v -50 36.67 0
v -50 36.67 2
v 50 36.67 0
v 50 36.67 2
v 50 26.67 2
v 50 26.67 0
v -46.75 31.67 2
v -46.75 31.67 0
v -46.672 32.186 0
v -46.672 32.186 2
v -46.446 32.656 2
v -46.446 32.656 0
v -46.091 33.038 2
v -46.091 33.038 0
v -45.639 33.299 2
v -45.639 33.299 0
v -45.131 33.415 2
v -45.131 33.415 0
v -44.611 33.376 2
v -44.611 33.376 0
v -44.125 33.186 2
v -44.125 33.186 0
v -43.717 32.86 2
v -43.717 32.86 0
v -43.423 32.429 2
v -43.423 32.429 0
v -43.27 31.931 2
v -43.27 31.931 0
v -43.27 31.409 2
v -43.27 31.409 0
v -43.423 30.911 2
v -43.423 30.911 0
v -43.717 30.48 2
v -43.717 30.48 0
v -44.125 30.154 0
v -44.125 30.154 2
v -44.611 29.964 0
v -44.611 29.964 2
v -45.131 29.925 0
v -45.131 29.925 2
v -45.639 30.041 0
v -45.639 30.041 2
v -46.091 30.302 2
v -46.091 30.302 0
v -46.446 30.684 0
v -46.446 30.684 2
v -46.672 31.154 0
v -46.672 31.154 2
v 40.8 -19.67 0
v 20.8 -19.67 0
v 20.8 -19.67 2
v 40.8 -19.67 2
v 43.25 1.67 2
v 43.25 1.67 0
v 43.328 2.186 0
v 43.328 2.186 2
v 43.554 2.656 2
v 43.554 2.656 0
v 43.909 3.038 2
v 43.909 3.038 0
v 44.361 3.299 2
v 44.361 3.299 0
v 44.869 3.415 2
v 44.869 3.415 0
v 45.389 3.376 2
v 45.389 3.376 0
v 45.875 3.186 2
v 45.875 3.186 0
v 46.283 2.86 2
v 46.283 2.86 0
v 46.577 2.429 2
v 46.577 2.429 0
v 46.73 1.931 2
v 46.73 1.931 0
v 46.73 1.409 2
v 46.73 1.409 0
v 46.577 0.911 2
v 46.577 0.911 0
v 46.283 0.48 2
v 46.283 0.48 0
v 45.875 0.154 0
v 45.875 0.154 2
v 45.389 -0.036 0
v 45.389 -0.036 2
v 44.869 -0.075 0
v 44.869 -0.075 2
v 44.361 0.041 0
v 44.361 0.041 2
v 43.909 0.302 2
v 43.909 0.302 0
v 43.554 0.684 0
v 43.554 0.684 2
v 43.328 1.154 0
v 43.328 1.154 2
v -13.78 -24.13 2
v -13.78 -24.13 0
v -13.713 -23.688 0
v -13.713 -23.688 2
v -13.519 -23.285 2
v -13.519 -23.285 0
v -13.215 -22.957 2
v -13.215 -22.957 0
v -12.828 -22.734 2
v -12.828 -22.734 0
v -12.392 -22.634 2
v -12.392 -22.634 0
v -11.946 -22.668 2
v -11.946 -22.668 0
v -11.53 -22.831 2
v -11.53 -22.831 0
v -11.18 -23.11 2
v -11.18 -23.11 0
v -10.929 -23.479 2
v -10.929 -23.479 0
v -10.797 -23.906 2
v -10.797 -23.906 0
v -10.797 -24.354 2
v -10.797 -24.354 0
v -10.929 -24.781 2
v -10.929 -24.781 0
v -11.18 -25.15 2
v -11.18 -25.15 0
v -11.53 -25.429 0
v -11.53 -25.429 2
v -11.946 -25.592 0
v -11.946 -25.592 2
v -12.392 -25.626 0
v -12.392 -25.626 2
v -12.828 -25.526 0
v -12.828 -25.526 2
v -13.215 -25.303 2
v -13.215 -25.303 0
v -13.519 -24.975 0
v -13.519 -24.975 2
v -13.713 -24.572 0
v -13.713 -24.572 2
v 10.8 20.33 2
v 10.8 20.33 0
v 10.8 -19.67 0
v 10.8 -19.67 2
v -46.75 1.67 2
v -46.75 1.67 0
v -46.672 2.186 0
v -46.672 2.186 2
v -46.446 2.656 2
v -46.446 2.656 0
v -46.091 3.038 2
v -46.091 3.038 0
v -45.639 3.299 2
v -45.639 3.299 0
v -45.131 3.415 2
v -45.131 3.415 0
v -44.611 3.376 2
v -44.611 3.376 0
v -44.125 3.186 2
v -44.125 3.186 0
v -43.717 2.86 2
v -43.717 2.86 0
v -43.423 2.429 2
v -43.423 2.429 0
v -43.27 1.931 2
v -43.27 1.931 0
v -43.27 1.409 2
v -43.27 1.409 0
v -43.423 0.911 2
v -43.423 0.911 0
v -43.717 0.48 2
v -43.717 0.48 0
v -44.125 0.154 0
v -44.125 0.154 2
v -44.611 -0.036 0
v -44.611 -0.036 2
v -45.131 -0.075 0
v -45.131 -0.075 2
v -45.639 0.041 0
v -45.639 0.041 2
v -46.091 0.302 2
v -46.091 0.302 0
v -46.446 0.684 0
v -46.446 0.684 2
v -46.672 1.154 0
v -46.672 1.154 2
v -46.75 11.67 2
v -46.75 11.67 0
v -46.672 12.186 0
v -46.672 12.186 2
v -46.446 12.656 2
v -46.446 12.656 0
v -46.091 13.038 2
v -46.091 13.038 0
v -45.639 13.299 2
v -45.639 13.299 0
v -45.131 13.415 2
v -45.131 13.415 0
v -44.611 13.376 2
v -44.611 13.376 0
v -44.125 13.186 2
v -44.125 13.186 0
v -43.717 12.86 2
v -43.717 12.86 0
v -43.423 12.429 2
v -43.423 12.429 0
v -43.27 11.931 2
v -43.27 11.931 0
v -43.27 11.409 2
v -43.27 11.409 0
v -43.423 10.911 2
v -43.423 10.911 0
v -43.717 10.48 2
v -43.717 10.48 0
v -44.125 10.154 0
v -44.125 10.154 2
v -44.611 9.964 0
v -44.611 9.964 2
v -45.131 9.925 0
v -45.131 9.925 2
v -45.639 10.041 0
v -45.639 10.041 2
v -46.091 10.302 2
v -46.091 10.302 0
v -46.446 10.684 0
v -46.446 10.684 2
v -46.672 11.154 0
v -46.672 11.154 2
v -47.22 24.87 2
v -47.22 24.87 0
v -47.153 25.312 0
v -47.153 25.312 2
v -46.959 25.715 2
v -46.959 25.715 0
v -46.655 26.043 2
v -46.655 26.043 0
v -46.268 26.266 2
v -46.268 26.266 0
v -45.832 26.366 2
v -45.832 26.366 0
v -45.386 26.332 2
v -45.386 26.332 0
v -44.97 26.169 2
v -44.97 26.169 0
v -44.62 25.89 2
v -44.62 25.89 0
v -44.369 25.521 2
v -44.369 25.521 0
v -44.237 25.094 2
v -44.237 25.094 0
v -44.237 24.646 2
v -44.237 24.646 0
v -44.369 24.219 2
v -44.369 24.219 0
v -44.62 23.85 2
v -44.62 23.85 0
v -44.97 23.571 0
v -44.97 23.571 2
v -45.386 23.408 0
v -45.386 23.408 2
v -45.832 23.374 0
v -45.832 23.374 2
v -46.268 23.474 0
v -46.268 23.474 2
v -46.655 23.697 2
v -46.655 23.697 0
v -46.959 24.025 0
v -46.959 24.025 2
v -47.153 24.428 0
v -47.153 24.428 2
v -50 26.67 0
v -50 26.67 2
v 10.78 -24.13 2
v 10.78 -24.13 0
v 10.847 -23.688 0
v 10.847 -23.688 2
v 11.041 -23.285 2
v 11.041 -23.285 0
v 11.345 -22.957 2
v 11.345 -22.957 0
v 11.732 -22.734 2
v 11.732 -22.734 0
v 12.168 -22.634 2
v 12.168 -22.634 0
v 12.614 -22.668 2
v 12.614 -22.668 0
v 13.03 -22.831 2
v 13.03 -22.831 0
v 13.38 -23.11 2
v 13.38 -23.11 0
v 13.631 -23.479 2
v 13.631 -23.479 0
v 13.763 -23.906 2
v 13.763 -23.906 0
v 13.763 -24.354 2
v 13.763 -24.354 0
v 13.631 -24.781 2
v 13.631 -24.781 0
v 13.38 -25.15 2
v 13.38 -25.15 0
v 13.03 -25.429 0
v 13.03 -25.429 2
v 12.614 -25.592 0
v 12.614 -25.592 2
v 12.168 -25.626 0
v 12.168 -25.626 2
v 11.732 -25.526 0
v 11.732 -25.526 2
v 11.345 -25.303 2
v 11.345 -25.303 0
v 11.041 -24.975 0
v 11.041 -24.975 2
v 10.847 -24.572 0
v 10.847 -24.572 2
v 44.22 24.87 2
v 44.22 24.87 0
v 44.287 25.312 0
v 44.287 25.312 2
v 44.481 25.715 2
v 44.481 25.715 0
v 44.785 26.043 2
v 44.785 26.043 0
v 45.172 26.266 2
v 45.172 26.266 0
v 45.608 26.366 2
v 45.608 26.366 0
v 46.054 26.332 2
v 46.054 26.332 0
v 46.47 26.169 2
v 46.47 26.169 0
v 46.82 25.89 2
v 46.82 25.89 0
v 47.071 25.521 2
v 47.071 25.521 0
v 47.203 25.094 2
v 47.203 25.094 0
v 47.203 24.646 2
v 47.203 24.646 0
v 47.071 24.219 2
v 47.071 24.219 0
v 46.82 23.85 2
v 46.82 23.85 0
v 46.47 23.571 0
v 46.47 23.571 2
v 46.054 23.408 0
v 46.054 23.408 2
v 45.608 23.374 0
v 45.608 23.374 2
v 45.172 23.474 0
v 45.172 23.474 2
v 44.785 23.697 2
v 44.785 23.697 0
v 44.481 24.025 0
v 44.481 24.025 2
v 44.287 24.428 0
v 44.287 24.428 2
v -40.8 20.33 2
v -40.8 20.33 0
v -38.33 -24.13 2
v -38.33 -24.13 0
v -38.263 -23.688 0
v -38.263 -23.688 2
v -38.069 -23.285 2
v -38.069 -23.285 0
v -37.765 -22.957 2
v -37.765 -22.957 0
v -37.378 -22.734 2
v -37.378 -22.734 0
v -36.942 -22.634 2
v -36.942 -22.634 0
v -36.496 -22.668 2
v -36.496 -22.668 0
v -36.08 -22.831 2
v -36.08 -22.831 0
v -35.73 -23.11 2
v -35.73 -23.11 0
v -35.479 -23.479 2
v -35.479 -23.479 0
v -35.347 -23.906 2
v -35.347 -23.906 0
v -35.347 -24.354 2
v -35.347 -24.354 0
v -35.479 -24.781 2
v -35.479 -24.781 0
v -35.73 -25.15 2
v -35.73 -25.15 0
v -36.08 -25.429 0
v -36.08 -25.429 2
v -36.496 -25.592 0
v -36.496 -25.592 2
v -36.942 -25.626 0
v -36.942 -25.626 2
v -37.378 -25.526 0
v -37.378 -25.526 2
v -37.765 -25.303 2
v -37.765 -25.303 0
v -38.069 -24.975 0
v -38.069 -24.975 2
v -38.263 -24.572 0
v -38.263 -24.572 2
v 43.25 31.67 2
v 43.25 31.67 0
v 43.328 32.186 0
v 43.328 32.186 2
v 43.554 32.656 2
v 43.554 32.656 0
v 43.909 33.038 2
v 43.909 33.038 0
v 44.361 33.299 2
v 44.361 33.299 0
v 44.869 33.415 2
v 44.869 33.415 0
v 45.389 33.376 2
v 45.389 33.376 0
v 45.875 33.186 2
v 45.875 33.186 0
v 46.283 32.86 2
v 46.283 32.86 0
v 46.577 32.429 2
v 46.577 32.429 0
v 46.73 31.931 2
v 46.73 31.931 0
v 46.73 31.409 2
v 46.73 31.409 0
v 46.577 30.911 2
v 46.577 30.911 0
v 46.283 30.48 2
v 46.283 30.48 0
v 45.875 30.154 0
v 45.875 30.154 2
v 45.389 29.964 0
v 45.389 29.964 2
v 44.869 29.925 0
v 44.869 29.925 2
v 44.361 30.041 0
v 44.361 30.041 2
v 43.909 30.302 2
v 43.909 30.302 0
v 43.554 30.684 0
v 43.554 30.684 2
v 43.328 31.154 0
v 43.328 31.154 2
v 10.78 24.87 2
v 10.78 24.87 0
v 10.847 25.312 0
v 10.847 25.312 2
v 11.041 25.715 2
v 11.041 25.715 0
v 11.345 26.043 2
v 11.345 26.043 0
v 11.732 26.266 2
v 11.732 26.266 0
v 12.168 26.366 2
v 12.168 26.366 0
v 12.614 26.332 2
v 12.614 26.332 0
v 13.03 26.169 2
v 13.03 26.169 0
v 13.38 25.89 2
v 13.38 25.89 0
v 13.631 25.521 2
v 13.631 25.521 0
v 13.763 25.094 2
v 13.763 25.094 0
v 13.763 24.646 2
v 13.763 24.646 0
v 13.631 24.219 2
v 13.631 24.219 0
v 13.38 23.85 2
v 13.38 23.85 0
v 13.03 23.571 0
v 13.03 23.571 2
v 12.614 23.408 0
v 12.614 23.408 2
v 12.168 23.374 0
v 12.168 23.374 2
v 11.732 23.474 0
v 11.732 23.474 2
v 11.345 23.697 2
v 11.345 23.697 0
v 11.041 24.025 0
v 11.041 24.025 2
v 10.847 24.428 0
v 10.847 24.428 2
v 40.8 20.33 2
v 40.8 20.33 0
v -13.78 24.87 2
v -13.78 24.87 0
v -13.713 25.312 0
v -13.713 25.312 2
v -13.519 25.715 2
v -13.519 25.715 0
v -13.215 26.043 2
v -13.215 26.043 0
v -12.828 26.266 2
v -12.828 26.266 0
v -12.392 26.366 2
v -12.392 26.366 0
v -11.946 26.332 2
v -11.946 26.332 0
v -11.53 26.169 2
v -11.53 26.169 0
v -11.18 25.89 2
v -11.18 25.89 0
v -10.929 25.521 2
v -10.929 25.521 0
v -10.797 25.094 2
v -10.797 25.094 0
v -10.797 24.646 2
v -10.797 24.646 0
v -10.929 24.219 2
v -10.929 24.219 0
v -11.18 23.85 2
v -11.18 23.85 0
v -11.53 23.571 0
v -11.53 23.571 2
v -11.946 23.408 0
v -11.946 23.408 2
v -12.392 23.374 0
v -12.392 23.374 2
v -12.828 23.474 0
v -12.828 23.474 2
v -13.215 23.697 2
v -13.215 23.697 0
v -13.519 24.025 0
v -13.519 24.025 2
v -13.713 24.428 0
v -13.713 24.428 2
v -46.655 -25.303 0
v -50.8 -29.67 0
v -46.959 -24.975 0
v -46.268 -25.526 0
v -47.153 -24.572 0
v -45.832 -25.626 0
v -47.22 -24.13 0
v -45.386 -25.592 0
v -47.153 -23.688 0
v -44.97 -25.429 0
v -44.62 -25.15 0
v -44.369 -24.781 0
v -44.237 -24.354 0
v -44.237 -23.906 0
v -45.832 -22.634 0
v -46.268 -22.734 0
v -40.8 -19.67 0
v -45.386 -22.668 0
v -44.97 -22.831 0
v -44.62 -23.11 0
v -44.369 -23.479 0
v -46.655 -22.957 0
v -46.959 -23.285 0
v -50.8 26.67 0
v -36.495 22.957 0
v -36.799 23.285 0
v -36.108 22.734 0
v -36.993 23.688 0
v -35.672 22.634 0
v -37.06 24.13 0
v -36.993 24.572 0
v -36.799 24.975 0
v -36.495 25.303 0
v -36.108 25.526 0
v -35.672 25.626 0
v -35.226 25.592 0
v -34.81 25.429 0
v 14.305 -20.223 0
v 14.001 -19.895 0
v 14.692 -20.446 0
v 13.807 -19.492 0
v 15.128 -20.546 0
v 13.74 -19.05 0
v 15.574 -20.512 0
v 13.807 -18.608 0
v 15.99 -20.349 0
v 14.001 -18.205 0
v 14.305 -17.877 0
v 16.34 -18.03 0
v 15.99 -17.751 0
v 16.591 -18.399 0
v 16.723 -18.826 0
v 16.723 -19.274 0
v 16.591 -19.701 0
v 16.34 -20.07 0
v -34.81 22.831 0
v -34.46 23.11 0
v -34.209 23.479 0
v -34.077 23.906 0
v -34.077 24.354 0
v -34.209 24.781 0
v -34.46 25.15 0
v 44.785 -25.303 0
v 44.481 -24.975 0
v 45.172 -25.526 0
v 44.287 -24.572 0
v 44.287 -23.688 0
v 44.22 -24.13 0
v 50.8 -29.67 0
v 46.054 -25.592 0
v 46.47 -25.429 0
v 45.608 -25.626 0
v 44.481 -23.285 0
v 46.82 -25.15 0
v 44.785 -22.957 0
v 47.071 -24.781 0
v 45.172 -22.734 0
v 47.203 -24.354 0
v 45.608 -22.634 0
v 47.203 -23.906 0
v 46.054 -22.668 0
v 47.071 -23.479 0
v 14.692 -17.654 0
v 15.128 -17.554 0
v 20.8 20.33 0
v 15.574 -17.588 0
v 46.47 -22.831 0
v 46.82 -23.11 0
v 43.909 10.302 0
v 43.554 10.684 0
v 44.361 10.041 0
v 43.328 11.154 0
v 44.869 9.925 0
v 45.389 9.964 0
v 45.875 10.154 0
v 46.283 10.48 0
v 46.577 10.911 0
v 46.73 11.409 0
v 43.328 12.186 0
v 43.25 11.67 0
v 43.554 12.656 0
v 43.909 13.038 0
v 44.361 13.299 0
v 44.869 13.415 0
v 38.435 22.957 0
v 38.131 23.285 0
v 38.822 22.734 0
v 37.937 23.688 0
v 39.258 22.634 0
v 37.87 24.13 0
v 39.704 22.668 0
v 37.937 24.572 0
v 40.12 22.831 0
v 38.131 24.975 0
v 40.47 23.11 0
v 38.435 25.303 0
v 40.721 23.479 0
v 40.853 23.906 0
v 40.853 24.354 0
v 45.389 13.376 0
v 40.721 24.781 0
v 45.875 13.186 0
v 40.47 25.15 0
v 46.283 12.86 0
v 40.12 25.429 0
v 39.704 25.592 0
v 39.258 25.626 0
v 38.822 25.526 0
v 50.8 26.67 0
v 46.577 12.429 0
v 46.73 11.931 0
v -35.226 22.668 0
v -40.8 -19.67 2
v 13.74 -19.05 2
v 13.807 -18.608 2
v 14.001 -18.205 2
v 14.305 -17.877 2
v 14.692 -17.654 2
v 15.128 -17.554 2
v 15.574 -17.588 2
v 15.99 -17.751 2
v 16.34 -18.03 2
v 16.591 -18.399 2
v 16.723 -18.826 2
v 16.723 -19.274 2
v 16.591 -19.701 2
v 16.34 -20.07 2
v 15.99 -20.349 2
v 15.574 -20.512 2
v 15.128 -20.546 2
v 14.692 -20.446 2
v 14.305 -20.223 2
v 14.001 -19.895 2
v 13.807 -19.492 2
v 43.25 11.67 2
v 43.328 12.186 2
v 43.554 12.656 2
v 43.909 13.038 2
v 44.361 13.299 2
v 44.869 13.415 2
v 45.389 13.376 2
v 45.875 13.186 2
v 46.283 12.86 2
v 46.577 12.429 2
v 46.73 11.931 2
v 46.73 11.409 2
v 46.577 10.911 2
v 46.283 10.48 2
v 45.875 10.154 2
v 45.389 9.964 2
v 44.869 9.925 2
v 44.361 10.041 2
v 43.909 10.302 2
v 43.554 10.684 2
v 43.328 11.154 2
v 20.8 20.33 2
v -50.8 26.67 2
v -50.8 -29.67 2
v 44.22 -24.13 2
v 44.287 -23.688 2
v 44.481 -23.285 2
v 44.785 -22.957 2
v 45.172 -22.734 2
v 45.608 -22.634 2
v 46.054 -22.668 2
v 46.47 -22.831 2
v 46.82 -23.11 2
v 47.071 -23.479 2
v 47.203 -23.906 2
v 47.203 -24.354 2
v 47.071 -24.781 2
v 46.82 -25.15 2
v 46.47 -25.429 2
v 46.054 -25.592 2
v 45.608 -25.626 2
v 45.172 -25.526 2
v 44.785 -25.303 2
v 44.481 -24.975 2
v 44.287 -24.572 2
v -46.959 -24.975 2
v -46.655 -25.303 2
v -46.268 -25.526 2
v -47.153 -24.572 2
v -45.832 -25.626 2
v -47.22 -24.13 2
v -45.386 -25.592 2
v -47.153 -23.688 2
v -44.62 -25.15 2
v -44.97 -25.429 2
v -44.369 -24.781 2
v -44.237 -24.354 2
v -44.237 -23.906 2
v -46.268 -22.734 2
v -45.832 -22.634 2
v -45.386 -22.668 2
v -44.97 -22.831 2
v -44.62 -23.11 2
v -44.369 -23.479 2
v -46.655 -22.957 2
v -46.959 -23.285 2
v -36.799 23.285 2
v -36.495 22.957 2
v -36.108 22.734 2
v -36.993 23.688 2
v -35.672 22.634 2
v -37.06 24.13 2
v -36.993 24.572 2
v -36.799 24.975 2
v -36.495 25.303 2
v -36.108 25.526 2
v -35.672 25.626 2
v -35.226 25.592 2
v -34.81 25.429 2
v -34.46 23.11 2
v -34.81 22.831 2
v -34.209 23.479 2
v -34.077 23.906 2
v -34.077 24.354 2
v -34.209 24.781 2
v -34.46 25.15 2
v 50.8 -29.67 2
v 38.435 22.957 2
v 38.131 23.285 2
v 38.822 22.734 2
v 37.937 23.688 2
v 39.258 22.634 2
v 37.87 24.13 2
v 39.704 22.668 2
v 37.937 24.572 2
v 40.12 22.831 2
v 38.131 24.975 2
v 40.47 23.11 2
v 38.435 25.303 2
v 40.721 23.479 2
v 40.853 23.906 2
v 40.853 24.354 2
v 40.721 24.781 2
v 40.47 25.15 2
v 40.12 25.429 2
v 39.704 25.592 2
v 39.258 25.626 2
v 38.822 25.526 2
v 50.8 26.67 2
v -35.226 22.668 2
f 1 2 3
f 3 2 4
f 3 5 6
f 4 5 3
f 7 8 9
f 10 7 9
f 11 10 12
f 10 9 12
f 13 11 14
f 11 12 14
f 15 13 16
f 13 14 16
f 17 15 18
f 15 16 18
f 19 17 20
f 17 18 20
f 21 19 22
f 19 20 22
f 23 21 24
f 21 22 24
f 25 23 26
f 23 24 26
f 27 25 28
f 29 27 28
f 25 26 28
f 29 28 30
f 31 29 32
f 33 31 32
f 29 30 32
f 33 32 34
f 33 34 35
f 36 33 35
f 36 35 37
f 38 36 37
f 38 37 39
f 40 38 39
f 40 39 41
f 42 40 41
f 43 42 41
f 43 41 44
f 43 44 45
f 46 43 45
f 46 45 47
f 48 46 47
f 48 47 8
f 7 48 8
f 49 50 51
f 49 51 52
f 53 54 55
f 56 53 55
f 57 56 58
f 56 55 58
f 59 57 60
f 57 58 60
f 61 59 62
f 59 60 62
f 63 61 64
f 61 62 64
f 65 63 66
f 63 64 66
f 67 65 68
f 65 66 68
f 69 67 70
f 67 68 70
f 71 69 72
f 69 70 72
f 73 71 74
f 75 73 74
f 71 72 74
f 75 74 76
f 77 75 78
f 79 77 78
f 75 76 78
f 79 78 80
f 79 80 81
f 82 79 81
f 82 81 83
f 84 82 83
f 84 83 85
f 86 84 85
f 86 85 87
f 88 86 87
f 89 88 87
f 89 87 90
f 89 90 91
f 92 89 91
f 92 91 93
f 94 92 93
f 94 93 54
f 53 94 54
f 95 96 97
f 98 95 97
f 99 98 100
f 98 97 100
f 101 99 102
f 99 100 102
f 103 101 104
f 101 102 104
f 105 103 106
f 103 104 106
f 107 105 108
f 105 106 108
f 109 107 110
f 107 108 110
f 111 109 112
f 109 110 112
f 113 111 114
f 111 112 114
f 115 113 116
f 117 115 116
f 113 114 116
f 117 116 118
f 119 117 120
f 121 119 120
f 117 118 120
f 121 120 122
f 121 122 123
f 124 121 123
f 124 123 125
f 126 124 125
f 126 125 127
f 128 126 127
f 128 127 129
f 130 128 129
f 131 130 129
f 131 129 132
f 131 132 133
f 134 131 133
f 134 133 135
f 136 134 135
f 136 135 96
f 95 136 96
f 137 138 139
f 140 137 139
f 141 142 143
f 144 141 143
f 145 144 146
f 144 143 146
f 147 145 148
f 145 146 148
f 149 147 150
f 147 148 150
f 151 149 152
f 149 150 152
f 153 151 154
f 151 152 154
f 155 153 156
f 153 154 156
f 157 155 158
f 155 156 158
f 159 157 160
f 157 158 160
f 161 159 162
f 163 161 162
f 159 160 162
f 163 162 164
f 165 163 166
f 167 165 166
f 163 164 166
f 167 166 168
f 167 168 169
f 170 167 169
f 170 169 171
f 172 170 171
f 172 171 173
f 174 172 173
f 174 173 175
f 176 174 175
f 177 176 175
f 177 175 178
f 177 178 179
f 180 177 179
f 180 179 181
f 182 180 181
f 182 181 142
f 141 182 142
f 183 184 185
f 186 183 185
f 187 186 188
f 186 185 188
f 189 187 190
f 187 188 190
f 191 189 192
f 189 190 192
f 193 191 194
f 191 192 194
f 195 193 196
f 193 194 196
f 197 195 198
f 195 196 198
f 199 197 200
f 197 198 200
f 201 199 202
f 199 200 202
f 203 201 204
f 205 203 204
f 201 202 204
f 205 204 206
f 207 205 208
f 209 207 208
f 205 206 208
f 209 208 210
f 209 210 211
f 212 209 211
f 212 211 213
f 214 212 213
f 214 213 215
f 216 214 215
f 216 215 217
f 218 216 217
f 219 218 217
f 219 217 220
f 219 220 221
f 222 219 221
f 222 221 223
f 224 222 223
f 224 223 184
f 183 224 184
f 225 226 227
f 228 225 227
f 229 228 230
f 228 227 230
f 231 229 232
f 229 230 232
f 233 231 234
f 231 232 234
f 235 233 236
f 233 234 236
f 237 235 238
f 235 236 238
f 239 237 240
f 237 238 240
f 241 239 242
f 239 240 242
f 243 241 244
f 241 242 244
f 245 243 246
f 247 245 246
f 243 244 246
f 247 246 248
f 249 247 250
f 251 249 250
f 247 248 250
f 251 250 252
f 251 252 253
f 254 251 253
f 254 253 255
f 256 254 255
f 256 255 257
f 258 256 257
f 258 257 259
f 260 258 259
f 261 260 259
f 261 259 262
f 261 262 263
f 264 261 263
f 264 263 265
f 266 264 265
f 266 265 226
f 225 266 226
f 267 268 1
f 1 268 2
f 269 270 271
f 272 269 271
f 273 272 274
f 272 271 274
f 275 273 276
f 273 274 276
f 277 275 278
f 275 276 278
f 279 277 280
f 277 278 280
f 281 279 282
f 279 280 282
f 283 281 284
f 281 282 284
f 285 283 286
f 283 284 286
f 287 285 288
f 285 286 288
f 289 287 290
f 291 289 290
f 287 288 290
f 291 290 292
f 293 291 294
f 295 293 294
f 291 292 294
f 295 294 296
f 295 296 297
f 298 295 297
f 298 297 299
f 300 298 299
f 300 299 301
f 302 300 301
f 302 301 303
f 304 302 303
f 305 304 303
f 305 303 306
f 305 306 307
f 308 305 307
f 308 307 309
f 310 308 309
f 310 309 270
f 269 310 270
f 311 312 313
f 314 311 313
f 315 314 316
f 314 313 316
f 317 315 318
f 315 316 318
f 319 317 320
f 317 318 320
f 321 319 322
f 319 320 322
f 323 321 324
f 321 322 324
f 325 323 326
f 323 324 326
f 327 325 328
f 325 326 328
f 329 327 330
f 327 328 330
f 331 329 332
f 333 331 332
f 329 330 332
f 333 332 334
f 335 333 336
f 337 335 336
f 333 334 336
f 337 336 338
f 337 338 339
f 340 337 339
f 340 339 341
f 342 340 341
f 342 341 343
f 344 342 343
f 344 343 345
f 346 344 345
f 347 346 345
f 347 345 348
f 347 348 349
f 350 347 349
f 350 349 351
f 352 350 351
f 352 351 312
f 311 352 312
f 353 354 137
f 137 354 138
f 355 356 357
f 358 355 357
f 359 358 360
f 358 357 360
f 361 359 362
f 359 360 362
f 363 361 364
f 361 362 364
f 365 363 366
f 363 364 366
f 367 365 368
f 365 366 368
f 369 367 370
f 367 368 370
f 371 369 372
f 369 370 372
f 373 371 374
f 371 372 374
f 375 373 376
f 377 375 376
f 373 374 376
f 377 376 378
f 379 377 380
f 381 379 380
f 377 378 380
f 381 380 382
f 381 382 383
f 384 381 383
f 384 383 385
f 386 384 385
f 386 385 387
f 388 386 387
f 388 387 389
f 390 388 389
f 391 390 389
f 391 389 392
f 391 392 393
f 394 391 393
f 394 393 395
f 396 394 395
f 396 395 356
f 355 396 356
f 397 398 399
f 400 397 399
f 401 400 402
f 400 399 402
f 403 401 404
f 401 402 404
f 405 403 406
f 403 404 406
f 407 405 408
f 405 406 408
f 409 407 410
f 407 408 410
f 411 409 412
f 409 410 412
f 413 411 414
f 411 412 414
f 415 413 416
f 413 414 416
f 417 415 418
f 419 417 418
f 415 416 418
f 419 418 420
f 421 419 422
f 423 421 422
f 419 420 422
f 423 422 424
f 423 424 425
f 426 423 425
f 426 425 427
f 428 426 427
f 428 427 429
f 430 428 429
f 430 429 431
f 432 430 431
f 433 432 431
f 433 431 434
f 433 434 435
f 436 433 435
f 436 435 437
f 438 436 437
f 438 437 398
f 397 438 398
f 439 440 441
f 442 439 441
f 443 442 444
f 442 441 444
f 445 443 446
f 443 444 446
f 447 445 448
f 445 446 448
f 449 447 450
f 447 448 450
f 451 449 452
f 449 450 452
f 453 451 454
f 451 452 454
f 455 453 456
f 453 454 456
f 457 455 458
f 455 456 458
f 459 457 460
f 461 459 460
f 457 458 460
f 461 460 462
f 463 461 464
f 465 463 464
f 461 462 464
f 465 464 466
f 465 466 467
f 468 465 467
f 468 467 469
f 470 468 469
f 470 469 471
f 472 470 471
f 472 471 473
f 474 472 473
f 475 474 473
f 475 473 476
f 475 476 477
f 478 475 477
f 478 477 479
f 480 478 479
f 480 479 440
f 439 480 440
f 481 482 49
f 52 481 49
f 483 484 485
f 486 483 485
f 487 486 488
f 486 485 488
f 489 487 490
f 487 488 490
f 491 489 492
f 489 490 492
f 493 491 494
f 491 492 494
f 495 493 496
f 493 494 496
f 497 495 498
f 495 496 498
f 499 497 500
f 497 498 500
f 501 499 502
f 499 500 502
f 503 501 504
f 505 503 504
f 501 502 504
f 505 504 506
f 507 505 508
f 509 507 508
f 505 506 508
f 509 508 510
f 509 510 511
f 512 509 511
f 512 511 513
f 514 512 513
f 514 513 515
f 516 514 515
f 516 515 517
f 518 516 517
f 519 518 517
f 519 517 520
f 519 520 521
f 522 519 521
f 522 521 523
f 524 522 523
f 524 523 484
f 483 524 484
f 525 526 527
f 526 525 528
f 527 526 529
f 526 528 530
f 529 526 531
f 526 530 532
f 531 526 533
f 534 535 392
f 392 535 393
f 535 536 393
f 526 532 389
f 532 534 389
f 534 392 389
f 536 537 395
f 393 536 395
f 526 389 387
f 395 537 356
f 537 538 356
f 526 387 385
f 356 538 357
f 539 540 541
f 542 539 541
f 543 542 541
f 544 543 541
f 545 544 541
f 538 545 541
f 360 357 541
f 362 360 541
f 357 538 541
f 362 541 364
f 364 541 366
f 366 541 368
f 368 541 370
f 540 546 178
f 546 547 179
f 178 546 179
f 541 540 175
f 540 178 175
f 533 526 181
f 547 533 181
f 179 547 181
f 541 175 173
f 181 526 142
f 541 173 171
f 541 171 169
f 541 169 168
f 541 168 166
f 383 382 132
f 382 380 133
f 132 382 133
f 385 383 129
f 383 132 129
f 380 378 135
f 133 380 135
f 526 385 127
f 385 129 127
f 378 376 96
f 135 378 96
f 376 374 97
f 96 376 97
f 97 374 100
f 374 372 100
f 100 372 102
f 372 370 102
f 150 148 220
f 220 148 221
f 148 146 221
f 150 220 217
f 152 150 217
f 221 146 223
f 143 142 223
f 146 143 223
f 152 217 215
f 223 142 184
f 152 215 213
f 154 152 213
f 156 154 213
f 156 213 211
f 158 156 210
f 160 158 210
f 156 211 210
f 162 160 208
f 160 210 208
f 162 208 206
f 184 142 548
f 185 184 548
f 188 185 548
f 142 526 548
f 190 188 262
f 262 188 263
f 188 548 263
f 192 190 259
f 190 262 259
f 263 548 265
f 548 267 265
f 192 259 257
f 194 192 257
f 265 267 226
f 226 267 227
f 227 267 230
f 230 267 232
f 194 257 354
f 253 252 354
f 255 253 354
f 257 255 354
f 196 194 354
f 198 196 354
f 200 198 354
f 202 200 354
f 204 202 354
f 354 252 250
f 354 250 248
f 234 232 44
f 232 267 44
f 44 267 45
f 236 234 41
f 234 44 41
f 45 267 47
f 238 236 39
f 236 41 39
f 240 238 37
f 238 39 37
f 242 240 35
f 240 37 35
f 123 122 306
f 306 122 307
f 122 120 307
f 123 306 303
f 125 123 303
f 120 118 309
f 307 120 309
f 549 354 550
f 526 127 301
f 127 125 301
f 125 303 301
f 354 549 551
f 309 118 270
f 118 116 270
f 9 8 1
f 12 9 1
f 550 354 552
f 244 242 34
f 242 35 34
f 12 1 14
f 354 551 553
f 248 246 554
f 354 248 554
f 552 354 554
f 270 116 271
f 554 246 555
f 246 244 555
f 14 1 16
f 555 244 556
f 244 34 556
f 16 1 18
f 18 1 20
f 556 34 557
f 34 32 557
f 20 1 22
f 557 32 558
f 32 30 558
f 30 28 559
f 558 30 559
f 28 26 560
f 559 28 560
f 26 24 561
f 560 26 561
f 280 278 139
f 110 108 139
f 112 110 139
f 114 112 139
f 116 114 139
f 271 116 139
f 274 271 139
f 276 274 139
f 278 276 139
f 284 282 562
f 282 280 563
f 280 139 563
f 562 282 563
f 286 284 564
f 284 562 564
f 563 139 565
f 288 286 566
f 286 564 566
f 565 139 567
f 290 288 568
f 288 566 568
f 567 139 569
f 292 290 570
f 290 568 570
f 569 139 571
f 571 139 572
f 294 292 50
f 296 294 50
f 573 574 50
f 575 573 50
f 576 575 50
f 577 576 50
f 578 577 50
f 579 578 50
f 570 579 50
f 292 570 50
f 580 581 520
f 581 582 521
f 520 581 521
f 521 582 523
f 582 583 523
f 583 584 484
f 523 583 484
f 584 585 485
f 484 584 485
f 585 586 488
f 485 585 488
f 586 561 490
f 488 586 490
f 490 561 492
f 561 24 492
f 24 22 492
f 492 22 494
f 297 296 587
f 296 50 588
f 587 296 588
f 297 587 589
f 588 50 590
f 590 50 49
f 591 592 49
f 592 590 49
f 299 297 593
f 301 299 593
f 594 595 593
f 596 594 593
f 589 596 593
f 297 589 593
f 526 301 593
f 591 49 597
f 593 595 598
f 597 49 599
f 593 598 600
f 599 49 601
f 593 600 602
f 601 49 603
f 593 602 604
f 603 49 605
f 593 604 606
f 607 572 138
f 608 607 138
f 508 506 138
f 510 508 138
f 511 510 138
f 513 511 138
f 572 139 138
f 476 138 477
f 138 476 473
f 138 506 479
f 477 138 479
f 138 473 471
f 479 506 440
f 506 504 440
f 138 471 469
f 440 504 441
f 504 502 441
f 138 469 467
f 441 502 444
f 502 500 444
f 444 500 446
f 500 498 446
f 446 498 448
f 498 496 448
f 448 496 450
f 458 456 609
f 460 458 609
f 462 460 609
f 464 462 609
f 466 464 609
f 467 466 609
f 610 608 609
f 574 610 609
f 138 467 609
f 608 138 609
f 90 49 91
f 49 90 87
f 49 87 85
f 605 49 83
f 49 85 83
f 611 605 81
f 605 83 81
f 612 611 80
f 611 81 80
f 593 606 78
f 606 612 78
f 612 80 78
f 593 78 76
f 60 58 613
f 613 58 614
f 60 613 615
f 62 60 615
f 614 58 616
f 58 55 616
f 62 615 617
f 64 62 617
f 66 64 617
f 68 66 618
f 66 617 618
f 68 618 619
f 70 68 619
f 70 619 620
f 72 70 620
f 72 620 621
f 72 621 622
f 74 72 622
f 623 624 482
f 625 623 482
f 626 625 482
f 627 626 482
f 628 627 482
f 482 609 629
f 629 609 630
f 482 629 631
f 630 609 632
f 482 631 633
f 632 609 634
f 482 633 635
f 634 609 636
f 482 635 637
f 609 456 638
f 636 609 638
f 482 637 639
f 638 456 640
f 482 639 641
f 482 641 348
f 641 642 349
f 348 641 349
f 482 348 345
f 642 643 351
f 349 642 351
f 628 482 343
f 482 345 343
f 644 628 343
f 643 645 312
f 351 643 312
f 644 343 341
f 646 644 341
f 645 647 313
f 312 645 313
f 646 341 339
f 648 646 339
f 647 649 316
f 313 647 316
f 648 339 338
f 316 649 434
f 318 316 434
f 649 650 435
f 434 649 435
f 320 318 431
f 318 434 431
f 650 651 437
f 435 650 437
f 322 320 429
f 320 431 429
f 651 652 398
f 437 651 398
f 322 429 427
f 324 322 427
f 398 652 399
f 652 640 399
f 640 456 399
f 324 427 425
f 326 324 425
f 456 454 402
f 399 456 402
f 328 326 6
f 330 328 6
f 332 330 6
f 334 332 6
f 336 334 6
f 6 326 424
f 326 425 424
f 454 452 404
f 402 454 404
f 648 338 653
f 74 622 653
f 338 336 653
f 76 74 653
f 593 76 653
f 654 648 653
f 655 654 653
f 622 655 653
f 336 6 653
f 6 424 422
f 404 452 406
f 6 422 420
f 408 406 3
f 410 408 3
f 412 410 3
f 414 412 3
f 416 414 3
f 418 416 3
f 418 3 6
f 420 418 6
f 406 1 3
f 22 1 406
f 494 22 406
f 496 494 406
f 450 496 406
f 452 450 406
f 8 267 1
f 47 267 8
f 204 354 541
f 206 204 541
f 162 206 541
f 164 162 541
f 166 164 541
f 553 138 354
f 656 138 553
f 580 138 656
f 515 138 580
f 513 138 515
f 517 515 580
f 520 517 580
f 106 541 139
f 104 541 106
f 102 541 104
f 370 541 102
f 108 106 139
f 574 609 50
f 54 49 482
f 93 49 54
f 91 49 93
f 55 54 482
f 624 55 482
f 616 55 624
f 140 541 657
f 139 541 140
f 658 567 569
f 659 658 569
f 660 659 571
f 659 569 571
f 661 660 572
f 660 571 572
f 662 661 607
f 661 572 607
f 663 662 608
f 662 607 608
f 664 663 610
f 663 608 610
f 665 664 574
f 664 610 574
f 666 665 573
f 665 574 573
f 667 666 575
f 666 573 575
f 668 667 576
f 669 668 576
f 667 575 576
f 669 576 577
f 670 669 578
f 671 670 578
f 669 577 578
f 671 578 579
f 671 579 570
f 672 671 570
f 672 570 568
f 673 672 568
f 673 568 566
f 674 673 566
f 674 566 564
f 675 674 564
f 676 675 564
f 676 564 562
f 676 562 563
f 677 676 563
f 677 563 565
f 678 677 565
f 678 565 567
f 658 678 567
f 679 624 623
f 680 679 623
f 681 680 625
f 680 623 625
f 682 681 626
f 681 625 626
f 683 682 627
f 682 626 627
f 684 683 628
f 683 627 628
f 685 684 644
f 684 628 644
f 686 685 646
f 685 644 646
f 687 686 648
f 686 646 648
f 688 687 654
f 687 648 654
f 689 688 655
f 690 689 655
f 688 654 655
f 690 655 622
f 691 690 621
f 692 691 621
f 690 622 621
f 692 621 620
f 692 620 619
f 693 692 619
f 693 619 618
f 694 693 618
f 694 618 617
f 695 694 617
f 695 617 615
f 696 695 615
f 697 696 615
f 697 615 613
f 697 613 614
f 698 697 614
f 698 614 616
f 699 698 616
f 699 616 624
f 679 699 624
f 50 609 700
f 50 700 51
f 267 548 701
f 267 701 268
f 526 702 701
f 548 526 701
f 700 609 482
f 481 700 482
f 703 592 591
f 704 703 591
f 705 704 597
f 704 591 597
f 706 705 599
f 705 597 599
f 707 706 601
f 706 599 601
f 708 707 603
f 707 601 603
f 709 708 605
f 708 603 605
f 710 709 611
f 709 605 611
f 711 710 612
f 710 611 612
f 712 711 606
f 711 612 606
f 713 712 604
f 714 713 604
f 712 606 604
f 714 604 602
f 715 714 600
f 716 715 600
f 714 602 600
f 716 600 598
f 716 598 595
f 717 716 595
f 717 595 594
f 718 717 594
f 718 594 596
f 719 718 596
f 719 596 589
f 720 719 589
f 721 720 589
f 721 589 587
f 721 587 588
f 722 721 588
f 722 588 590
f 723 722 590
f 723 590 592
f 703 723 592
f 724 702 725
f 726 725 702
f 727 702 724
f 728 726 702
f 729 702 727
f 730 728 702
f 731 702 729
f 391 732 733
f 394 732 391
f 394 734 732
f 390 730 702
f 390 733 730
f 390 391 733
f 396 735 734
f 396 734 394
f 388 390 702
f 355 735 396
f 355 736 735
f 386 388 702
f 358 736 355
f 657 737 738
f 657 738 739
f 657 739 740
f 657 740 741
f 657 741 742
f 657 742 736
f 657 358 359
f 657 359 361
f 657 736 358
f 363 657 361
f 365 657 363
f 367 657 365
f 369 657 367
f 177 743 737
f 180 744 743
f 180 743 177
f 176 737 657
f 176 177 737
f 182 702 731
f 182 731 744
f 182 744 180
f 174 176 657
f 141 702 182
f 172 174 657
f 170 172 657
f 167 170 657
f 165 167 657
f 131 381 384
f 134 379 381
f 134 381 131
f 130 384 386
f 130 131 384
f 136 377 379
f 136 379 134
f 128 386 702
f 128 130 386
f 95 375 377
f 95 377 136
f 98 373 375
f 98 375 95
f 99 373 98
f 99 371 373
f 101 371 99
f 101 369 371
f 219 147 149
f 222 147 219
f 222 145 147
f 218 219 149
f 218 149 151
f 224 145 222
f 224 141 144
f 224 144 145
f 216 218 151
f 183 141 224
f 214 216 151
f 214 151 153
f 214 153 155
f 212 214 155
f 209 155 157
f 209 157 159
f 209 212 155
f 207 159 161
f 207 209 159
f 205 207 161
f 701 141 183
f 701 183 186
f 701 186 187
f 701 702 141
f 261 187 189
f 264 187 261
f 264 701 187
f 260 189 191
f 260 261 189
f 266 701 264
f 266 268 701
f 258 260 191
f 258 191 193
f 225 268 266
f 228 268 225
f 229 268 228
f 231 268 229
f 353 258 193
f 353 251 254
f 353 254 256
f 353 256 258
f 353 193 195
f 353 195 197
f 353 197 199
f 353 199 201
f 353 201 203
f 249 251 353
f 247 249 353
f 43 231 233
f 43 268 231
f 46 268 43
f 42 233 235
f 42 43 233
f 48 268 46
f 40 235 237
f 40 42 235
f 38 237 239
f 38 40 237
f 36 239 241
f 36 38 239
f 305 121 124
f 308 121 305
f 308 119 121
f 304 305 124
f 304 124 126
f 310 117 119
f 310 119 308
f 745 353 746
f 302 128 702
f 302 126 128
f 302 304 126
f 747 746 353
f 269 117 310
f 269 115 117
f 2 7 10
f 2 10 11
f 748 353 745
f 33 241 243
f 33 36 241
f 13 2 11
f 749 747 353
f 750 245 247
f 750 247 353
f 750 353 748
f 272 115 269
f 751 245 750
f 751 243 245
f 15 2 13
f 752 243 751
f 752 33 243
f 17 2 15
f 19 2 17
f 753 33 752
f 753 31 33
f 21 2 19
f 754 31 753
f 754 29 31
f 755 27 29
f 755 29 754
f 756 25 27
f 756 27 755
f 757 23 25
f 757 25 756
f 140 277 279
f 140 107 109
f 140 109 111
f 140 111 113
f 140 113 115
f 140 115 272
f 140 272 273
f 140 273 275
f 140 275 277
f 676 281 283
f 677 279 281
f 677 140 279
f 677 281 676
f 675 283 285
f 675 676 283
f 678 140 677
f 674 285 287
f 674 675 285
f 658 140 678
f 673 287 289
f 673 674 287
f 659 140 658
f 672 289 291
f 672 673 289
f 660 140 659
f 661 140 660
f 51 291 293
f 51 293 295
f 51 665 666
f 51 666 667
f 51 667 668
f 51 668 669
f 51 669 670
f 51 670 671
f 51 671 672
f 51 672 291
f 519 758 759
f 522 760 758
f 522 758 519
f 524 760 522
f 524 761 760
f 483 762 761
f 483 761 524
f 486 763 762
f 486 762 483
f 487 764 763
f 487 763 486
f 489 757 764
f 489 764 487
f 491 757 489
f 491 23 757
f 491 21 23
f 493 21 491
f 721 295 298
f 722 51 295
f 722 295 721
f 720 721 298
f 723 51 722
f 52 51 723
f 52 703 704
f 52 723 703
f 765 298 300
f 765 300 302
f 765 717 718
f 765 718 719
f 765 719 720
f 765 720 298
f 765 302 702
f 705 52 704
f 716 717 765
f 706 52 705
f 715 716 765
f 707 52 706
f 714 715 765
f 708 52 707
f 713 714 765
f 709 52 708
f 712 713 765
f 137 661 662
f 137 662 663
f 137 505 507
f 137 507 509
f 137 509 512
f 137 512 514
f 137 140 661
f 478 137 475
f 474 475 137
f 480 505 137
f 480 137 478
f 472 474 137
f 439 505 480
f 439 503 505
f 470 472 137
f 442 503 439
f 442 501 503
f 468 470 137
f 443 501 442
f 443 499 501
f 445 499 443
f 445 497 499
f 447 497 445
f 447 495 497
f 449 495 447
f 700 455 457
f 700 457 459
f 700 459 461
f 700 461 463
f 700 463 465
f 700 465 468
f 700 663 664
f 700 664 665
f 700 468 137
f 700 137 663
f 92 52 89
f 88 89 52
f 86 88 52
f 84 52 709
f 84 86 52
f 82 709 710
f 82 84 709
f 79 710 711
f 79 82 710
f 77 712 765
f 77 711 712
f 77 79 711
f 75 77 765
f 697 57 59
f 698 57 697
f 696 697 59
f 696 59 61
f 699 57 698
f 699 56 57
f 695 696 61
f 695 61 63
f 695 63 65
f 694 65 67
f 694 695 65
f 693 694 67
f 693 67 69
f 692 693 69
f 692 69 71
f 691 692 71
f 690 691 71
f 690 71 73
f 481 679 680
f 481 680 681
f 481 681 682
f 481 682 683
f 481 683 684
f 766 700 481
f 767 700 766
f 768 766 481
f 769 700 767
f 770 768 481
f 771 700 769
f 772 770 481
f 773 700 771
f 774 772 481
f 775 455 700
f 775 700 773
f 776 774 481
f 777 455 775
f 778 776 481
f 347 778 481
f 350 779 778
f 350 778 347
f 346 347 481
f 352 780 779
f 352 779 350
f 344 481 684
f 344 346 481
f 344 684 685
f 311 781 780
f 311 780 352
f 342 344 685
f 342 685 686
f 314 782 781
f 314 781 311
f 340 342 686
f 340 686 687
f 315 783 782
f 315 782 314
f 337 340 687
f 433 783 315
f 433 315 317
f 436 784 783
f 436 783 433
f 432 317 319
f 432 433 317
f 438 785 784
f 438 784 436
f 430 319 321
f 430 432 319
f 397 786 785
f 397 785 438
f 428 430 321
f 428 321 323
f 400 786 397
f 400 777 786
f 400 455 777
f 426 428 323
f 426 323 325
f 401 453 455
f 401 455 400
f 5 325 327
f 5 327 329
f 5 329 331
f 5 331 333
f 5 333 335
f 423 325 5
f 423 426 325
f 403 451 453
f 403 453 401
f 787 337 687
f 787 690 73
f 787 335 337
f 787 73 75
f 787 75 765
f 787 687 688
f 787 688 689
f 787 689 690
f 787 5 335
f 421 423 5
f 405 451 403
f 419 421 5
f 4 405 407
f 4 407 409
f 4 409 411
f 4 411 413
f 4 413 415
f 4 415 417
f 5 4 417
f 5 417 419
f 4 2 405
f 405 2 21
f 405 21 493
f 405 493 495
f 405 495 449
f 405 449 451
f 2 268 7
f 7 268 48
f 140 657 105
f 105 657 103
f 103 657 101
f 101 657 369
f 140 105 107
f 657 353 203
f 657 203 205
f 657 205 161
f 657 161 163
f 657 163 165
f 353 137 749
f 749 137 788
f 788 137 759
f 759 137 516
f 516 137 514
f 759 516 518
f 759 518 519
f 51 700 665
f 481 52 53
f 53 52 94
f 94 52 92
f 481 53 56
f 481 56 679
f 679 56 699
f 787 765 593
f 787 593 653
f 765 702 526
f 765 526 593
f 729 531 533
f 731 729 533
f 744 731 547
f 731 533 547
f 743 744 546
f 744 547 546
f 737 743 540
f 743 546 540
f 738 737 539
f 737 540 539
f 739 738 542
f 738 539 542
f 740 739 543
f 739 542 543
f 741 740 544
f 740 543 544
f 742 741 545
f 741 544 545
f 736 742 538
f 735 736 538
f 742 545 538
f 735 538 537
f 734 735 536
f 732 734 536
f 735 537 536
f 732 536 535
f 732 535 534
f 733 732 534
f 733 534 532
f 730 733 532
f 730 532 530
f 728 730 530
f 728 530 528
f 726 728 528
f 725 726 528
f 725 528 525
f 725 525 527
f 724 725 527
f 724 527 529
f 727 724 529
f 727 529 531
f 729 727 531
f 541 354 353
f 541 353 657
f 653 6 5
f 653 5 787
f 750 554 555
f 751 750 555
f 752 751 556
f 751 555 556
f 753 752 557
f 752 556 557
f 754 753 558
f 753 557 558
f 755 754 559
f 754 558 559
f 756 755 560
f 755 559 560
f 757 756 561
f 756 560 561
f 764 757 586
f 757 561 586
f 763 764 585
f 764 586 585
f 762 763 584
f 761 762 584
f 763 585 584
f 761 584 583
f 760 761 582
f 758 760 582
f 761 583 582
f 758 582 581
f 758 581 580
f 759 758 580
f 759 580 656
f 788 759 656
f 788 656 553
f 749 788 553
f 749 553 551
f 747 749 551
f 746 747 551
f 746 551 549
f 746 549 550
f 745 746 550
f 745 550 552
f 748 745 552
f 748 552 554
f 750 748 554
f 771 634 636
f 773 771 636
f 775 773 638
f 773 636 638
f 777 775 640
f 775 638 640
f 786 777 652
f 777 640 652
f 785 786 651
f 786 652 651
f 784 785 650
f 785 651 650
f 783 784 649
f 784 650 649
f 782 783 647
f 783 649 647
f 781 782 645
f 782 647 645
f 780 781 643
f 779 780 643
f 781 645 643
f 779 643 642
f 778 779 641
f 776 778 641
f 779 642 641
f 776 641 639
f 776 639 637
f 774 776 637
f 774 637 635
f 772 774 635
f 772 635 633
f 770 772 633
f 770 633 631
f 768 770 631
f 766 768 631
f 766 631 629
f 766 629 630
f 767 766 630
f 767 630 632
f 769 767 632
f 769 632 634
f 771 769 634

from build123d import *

# Parameters (mm, degrees)
F0_W      = 101.6
F0_H      = 53.34
F1_DEPTH  = 2
F3_D      = 3
F4_W      = 101.6
F4_H      = 3
F4_W_2    = 100
F4_H_2    = 10
F5_DEPTH  = 2
F7_D      = 3.5
F9_D      = 3
F10_W     = 51.6
F10_H     = 40
F10_W_2   = 20
F11_DEPTH = 2.001


with BuildPart() as f1:
    # F0 (on Top) → F1 (new body)
    with BuildSketch(Plane.XY):
        Rectangle(F0_W, F0_H)
    extrude(amount=F1_DEPTH)

    # F3 (through all)
    with Locations(Plane.XY.offset(2)):
        with Locations((-35.56, 24.13), (39.37, 24.13), (45.72, -24.13), (15.24, -19.05), (-36.83, -24.13)):
            Hole(F3_D / 2)

    # F4 (on face) → F5 (join, through all)
    with BuildSketch(Plane.XY.offset(2)):
        with Locations((0, -28.17)):
            Rectangle(F4_W, F4_H)
        with Locations((0, 31.67)):
            Rectangle(F4_W_2, F4_H_2)
    extrude(amount=-F5_DEPTH)

    # F7 (through all)
    with Locations(Plane.XY.offset(2)):
        with Locations((-45, 31.67), (45, 31.67), (-45, 11.67), (-45, 1.67), (45, 11.67), (45, 1.67)):
            Hole(F7_D / 2)

    # F9 (through all)
    with Locations(Plane.XY.offset(2)):
        with Locations((-45.72, -24.13), (-45.72, 24.87), (-12.28, 24.87), (12.28, 24.87), (12.28, -24.13), (-12.28, -24.13), (45.72, 24.87)):
            Hole(F9_D / 2)

    # F10 (on face) → F11 (cut, through all)
    with BuildSketch(Plane(origin=(0, 0, 0), x_dir=(1, 0, 0), z_dir=(0, 0, -1))):
        with Locations((-15, -0.33)):
            Rectangle(F10_W, F10_H)
        with Locations((30.8, -0.33)):
            Rectangle(F10_W_2, F10_H)
    extrude(amount=-F11_DEPTH, mode=Mode.SUBTRACT)


solid = f1.part
